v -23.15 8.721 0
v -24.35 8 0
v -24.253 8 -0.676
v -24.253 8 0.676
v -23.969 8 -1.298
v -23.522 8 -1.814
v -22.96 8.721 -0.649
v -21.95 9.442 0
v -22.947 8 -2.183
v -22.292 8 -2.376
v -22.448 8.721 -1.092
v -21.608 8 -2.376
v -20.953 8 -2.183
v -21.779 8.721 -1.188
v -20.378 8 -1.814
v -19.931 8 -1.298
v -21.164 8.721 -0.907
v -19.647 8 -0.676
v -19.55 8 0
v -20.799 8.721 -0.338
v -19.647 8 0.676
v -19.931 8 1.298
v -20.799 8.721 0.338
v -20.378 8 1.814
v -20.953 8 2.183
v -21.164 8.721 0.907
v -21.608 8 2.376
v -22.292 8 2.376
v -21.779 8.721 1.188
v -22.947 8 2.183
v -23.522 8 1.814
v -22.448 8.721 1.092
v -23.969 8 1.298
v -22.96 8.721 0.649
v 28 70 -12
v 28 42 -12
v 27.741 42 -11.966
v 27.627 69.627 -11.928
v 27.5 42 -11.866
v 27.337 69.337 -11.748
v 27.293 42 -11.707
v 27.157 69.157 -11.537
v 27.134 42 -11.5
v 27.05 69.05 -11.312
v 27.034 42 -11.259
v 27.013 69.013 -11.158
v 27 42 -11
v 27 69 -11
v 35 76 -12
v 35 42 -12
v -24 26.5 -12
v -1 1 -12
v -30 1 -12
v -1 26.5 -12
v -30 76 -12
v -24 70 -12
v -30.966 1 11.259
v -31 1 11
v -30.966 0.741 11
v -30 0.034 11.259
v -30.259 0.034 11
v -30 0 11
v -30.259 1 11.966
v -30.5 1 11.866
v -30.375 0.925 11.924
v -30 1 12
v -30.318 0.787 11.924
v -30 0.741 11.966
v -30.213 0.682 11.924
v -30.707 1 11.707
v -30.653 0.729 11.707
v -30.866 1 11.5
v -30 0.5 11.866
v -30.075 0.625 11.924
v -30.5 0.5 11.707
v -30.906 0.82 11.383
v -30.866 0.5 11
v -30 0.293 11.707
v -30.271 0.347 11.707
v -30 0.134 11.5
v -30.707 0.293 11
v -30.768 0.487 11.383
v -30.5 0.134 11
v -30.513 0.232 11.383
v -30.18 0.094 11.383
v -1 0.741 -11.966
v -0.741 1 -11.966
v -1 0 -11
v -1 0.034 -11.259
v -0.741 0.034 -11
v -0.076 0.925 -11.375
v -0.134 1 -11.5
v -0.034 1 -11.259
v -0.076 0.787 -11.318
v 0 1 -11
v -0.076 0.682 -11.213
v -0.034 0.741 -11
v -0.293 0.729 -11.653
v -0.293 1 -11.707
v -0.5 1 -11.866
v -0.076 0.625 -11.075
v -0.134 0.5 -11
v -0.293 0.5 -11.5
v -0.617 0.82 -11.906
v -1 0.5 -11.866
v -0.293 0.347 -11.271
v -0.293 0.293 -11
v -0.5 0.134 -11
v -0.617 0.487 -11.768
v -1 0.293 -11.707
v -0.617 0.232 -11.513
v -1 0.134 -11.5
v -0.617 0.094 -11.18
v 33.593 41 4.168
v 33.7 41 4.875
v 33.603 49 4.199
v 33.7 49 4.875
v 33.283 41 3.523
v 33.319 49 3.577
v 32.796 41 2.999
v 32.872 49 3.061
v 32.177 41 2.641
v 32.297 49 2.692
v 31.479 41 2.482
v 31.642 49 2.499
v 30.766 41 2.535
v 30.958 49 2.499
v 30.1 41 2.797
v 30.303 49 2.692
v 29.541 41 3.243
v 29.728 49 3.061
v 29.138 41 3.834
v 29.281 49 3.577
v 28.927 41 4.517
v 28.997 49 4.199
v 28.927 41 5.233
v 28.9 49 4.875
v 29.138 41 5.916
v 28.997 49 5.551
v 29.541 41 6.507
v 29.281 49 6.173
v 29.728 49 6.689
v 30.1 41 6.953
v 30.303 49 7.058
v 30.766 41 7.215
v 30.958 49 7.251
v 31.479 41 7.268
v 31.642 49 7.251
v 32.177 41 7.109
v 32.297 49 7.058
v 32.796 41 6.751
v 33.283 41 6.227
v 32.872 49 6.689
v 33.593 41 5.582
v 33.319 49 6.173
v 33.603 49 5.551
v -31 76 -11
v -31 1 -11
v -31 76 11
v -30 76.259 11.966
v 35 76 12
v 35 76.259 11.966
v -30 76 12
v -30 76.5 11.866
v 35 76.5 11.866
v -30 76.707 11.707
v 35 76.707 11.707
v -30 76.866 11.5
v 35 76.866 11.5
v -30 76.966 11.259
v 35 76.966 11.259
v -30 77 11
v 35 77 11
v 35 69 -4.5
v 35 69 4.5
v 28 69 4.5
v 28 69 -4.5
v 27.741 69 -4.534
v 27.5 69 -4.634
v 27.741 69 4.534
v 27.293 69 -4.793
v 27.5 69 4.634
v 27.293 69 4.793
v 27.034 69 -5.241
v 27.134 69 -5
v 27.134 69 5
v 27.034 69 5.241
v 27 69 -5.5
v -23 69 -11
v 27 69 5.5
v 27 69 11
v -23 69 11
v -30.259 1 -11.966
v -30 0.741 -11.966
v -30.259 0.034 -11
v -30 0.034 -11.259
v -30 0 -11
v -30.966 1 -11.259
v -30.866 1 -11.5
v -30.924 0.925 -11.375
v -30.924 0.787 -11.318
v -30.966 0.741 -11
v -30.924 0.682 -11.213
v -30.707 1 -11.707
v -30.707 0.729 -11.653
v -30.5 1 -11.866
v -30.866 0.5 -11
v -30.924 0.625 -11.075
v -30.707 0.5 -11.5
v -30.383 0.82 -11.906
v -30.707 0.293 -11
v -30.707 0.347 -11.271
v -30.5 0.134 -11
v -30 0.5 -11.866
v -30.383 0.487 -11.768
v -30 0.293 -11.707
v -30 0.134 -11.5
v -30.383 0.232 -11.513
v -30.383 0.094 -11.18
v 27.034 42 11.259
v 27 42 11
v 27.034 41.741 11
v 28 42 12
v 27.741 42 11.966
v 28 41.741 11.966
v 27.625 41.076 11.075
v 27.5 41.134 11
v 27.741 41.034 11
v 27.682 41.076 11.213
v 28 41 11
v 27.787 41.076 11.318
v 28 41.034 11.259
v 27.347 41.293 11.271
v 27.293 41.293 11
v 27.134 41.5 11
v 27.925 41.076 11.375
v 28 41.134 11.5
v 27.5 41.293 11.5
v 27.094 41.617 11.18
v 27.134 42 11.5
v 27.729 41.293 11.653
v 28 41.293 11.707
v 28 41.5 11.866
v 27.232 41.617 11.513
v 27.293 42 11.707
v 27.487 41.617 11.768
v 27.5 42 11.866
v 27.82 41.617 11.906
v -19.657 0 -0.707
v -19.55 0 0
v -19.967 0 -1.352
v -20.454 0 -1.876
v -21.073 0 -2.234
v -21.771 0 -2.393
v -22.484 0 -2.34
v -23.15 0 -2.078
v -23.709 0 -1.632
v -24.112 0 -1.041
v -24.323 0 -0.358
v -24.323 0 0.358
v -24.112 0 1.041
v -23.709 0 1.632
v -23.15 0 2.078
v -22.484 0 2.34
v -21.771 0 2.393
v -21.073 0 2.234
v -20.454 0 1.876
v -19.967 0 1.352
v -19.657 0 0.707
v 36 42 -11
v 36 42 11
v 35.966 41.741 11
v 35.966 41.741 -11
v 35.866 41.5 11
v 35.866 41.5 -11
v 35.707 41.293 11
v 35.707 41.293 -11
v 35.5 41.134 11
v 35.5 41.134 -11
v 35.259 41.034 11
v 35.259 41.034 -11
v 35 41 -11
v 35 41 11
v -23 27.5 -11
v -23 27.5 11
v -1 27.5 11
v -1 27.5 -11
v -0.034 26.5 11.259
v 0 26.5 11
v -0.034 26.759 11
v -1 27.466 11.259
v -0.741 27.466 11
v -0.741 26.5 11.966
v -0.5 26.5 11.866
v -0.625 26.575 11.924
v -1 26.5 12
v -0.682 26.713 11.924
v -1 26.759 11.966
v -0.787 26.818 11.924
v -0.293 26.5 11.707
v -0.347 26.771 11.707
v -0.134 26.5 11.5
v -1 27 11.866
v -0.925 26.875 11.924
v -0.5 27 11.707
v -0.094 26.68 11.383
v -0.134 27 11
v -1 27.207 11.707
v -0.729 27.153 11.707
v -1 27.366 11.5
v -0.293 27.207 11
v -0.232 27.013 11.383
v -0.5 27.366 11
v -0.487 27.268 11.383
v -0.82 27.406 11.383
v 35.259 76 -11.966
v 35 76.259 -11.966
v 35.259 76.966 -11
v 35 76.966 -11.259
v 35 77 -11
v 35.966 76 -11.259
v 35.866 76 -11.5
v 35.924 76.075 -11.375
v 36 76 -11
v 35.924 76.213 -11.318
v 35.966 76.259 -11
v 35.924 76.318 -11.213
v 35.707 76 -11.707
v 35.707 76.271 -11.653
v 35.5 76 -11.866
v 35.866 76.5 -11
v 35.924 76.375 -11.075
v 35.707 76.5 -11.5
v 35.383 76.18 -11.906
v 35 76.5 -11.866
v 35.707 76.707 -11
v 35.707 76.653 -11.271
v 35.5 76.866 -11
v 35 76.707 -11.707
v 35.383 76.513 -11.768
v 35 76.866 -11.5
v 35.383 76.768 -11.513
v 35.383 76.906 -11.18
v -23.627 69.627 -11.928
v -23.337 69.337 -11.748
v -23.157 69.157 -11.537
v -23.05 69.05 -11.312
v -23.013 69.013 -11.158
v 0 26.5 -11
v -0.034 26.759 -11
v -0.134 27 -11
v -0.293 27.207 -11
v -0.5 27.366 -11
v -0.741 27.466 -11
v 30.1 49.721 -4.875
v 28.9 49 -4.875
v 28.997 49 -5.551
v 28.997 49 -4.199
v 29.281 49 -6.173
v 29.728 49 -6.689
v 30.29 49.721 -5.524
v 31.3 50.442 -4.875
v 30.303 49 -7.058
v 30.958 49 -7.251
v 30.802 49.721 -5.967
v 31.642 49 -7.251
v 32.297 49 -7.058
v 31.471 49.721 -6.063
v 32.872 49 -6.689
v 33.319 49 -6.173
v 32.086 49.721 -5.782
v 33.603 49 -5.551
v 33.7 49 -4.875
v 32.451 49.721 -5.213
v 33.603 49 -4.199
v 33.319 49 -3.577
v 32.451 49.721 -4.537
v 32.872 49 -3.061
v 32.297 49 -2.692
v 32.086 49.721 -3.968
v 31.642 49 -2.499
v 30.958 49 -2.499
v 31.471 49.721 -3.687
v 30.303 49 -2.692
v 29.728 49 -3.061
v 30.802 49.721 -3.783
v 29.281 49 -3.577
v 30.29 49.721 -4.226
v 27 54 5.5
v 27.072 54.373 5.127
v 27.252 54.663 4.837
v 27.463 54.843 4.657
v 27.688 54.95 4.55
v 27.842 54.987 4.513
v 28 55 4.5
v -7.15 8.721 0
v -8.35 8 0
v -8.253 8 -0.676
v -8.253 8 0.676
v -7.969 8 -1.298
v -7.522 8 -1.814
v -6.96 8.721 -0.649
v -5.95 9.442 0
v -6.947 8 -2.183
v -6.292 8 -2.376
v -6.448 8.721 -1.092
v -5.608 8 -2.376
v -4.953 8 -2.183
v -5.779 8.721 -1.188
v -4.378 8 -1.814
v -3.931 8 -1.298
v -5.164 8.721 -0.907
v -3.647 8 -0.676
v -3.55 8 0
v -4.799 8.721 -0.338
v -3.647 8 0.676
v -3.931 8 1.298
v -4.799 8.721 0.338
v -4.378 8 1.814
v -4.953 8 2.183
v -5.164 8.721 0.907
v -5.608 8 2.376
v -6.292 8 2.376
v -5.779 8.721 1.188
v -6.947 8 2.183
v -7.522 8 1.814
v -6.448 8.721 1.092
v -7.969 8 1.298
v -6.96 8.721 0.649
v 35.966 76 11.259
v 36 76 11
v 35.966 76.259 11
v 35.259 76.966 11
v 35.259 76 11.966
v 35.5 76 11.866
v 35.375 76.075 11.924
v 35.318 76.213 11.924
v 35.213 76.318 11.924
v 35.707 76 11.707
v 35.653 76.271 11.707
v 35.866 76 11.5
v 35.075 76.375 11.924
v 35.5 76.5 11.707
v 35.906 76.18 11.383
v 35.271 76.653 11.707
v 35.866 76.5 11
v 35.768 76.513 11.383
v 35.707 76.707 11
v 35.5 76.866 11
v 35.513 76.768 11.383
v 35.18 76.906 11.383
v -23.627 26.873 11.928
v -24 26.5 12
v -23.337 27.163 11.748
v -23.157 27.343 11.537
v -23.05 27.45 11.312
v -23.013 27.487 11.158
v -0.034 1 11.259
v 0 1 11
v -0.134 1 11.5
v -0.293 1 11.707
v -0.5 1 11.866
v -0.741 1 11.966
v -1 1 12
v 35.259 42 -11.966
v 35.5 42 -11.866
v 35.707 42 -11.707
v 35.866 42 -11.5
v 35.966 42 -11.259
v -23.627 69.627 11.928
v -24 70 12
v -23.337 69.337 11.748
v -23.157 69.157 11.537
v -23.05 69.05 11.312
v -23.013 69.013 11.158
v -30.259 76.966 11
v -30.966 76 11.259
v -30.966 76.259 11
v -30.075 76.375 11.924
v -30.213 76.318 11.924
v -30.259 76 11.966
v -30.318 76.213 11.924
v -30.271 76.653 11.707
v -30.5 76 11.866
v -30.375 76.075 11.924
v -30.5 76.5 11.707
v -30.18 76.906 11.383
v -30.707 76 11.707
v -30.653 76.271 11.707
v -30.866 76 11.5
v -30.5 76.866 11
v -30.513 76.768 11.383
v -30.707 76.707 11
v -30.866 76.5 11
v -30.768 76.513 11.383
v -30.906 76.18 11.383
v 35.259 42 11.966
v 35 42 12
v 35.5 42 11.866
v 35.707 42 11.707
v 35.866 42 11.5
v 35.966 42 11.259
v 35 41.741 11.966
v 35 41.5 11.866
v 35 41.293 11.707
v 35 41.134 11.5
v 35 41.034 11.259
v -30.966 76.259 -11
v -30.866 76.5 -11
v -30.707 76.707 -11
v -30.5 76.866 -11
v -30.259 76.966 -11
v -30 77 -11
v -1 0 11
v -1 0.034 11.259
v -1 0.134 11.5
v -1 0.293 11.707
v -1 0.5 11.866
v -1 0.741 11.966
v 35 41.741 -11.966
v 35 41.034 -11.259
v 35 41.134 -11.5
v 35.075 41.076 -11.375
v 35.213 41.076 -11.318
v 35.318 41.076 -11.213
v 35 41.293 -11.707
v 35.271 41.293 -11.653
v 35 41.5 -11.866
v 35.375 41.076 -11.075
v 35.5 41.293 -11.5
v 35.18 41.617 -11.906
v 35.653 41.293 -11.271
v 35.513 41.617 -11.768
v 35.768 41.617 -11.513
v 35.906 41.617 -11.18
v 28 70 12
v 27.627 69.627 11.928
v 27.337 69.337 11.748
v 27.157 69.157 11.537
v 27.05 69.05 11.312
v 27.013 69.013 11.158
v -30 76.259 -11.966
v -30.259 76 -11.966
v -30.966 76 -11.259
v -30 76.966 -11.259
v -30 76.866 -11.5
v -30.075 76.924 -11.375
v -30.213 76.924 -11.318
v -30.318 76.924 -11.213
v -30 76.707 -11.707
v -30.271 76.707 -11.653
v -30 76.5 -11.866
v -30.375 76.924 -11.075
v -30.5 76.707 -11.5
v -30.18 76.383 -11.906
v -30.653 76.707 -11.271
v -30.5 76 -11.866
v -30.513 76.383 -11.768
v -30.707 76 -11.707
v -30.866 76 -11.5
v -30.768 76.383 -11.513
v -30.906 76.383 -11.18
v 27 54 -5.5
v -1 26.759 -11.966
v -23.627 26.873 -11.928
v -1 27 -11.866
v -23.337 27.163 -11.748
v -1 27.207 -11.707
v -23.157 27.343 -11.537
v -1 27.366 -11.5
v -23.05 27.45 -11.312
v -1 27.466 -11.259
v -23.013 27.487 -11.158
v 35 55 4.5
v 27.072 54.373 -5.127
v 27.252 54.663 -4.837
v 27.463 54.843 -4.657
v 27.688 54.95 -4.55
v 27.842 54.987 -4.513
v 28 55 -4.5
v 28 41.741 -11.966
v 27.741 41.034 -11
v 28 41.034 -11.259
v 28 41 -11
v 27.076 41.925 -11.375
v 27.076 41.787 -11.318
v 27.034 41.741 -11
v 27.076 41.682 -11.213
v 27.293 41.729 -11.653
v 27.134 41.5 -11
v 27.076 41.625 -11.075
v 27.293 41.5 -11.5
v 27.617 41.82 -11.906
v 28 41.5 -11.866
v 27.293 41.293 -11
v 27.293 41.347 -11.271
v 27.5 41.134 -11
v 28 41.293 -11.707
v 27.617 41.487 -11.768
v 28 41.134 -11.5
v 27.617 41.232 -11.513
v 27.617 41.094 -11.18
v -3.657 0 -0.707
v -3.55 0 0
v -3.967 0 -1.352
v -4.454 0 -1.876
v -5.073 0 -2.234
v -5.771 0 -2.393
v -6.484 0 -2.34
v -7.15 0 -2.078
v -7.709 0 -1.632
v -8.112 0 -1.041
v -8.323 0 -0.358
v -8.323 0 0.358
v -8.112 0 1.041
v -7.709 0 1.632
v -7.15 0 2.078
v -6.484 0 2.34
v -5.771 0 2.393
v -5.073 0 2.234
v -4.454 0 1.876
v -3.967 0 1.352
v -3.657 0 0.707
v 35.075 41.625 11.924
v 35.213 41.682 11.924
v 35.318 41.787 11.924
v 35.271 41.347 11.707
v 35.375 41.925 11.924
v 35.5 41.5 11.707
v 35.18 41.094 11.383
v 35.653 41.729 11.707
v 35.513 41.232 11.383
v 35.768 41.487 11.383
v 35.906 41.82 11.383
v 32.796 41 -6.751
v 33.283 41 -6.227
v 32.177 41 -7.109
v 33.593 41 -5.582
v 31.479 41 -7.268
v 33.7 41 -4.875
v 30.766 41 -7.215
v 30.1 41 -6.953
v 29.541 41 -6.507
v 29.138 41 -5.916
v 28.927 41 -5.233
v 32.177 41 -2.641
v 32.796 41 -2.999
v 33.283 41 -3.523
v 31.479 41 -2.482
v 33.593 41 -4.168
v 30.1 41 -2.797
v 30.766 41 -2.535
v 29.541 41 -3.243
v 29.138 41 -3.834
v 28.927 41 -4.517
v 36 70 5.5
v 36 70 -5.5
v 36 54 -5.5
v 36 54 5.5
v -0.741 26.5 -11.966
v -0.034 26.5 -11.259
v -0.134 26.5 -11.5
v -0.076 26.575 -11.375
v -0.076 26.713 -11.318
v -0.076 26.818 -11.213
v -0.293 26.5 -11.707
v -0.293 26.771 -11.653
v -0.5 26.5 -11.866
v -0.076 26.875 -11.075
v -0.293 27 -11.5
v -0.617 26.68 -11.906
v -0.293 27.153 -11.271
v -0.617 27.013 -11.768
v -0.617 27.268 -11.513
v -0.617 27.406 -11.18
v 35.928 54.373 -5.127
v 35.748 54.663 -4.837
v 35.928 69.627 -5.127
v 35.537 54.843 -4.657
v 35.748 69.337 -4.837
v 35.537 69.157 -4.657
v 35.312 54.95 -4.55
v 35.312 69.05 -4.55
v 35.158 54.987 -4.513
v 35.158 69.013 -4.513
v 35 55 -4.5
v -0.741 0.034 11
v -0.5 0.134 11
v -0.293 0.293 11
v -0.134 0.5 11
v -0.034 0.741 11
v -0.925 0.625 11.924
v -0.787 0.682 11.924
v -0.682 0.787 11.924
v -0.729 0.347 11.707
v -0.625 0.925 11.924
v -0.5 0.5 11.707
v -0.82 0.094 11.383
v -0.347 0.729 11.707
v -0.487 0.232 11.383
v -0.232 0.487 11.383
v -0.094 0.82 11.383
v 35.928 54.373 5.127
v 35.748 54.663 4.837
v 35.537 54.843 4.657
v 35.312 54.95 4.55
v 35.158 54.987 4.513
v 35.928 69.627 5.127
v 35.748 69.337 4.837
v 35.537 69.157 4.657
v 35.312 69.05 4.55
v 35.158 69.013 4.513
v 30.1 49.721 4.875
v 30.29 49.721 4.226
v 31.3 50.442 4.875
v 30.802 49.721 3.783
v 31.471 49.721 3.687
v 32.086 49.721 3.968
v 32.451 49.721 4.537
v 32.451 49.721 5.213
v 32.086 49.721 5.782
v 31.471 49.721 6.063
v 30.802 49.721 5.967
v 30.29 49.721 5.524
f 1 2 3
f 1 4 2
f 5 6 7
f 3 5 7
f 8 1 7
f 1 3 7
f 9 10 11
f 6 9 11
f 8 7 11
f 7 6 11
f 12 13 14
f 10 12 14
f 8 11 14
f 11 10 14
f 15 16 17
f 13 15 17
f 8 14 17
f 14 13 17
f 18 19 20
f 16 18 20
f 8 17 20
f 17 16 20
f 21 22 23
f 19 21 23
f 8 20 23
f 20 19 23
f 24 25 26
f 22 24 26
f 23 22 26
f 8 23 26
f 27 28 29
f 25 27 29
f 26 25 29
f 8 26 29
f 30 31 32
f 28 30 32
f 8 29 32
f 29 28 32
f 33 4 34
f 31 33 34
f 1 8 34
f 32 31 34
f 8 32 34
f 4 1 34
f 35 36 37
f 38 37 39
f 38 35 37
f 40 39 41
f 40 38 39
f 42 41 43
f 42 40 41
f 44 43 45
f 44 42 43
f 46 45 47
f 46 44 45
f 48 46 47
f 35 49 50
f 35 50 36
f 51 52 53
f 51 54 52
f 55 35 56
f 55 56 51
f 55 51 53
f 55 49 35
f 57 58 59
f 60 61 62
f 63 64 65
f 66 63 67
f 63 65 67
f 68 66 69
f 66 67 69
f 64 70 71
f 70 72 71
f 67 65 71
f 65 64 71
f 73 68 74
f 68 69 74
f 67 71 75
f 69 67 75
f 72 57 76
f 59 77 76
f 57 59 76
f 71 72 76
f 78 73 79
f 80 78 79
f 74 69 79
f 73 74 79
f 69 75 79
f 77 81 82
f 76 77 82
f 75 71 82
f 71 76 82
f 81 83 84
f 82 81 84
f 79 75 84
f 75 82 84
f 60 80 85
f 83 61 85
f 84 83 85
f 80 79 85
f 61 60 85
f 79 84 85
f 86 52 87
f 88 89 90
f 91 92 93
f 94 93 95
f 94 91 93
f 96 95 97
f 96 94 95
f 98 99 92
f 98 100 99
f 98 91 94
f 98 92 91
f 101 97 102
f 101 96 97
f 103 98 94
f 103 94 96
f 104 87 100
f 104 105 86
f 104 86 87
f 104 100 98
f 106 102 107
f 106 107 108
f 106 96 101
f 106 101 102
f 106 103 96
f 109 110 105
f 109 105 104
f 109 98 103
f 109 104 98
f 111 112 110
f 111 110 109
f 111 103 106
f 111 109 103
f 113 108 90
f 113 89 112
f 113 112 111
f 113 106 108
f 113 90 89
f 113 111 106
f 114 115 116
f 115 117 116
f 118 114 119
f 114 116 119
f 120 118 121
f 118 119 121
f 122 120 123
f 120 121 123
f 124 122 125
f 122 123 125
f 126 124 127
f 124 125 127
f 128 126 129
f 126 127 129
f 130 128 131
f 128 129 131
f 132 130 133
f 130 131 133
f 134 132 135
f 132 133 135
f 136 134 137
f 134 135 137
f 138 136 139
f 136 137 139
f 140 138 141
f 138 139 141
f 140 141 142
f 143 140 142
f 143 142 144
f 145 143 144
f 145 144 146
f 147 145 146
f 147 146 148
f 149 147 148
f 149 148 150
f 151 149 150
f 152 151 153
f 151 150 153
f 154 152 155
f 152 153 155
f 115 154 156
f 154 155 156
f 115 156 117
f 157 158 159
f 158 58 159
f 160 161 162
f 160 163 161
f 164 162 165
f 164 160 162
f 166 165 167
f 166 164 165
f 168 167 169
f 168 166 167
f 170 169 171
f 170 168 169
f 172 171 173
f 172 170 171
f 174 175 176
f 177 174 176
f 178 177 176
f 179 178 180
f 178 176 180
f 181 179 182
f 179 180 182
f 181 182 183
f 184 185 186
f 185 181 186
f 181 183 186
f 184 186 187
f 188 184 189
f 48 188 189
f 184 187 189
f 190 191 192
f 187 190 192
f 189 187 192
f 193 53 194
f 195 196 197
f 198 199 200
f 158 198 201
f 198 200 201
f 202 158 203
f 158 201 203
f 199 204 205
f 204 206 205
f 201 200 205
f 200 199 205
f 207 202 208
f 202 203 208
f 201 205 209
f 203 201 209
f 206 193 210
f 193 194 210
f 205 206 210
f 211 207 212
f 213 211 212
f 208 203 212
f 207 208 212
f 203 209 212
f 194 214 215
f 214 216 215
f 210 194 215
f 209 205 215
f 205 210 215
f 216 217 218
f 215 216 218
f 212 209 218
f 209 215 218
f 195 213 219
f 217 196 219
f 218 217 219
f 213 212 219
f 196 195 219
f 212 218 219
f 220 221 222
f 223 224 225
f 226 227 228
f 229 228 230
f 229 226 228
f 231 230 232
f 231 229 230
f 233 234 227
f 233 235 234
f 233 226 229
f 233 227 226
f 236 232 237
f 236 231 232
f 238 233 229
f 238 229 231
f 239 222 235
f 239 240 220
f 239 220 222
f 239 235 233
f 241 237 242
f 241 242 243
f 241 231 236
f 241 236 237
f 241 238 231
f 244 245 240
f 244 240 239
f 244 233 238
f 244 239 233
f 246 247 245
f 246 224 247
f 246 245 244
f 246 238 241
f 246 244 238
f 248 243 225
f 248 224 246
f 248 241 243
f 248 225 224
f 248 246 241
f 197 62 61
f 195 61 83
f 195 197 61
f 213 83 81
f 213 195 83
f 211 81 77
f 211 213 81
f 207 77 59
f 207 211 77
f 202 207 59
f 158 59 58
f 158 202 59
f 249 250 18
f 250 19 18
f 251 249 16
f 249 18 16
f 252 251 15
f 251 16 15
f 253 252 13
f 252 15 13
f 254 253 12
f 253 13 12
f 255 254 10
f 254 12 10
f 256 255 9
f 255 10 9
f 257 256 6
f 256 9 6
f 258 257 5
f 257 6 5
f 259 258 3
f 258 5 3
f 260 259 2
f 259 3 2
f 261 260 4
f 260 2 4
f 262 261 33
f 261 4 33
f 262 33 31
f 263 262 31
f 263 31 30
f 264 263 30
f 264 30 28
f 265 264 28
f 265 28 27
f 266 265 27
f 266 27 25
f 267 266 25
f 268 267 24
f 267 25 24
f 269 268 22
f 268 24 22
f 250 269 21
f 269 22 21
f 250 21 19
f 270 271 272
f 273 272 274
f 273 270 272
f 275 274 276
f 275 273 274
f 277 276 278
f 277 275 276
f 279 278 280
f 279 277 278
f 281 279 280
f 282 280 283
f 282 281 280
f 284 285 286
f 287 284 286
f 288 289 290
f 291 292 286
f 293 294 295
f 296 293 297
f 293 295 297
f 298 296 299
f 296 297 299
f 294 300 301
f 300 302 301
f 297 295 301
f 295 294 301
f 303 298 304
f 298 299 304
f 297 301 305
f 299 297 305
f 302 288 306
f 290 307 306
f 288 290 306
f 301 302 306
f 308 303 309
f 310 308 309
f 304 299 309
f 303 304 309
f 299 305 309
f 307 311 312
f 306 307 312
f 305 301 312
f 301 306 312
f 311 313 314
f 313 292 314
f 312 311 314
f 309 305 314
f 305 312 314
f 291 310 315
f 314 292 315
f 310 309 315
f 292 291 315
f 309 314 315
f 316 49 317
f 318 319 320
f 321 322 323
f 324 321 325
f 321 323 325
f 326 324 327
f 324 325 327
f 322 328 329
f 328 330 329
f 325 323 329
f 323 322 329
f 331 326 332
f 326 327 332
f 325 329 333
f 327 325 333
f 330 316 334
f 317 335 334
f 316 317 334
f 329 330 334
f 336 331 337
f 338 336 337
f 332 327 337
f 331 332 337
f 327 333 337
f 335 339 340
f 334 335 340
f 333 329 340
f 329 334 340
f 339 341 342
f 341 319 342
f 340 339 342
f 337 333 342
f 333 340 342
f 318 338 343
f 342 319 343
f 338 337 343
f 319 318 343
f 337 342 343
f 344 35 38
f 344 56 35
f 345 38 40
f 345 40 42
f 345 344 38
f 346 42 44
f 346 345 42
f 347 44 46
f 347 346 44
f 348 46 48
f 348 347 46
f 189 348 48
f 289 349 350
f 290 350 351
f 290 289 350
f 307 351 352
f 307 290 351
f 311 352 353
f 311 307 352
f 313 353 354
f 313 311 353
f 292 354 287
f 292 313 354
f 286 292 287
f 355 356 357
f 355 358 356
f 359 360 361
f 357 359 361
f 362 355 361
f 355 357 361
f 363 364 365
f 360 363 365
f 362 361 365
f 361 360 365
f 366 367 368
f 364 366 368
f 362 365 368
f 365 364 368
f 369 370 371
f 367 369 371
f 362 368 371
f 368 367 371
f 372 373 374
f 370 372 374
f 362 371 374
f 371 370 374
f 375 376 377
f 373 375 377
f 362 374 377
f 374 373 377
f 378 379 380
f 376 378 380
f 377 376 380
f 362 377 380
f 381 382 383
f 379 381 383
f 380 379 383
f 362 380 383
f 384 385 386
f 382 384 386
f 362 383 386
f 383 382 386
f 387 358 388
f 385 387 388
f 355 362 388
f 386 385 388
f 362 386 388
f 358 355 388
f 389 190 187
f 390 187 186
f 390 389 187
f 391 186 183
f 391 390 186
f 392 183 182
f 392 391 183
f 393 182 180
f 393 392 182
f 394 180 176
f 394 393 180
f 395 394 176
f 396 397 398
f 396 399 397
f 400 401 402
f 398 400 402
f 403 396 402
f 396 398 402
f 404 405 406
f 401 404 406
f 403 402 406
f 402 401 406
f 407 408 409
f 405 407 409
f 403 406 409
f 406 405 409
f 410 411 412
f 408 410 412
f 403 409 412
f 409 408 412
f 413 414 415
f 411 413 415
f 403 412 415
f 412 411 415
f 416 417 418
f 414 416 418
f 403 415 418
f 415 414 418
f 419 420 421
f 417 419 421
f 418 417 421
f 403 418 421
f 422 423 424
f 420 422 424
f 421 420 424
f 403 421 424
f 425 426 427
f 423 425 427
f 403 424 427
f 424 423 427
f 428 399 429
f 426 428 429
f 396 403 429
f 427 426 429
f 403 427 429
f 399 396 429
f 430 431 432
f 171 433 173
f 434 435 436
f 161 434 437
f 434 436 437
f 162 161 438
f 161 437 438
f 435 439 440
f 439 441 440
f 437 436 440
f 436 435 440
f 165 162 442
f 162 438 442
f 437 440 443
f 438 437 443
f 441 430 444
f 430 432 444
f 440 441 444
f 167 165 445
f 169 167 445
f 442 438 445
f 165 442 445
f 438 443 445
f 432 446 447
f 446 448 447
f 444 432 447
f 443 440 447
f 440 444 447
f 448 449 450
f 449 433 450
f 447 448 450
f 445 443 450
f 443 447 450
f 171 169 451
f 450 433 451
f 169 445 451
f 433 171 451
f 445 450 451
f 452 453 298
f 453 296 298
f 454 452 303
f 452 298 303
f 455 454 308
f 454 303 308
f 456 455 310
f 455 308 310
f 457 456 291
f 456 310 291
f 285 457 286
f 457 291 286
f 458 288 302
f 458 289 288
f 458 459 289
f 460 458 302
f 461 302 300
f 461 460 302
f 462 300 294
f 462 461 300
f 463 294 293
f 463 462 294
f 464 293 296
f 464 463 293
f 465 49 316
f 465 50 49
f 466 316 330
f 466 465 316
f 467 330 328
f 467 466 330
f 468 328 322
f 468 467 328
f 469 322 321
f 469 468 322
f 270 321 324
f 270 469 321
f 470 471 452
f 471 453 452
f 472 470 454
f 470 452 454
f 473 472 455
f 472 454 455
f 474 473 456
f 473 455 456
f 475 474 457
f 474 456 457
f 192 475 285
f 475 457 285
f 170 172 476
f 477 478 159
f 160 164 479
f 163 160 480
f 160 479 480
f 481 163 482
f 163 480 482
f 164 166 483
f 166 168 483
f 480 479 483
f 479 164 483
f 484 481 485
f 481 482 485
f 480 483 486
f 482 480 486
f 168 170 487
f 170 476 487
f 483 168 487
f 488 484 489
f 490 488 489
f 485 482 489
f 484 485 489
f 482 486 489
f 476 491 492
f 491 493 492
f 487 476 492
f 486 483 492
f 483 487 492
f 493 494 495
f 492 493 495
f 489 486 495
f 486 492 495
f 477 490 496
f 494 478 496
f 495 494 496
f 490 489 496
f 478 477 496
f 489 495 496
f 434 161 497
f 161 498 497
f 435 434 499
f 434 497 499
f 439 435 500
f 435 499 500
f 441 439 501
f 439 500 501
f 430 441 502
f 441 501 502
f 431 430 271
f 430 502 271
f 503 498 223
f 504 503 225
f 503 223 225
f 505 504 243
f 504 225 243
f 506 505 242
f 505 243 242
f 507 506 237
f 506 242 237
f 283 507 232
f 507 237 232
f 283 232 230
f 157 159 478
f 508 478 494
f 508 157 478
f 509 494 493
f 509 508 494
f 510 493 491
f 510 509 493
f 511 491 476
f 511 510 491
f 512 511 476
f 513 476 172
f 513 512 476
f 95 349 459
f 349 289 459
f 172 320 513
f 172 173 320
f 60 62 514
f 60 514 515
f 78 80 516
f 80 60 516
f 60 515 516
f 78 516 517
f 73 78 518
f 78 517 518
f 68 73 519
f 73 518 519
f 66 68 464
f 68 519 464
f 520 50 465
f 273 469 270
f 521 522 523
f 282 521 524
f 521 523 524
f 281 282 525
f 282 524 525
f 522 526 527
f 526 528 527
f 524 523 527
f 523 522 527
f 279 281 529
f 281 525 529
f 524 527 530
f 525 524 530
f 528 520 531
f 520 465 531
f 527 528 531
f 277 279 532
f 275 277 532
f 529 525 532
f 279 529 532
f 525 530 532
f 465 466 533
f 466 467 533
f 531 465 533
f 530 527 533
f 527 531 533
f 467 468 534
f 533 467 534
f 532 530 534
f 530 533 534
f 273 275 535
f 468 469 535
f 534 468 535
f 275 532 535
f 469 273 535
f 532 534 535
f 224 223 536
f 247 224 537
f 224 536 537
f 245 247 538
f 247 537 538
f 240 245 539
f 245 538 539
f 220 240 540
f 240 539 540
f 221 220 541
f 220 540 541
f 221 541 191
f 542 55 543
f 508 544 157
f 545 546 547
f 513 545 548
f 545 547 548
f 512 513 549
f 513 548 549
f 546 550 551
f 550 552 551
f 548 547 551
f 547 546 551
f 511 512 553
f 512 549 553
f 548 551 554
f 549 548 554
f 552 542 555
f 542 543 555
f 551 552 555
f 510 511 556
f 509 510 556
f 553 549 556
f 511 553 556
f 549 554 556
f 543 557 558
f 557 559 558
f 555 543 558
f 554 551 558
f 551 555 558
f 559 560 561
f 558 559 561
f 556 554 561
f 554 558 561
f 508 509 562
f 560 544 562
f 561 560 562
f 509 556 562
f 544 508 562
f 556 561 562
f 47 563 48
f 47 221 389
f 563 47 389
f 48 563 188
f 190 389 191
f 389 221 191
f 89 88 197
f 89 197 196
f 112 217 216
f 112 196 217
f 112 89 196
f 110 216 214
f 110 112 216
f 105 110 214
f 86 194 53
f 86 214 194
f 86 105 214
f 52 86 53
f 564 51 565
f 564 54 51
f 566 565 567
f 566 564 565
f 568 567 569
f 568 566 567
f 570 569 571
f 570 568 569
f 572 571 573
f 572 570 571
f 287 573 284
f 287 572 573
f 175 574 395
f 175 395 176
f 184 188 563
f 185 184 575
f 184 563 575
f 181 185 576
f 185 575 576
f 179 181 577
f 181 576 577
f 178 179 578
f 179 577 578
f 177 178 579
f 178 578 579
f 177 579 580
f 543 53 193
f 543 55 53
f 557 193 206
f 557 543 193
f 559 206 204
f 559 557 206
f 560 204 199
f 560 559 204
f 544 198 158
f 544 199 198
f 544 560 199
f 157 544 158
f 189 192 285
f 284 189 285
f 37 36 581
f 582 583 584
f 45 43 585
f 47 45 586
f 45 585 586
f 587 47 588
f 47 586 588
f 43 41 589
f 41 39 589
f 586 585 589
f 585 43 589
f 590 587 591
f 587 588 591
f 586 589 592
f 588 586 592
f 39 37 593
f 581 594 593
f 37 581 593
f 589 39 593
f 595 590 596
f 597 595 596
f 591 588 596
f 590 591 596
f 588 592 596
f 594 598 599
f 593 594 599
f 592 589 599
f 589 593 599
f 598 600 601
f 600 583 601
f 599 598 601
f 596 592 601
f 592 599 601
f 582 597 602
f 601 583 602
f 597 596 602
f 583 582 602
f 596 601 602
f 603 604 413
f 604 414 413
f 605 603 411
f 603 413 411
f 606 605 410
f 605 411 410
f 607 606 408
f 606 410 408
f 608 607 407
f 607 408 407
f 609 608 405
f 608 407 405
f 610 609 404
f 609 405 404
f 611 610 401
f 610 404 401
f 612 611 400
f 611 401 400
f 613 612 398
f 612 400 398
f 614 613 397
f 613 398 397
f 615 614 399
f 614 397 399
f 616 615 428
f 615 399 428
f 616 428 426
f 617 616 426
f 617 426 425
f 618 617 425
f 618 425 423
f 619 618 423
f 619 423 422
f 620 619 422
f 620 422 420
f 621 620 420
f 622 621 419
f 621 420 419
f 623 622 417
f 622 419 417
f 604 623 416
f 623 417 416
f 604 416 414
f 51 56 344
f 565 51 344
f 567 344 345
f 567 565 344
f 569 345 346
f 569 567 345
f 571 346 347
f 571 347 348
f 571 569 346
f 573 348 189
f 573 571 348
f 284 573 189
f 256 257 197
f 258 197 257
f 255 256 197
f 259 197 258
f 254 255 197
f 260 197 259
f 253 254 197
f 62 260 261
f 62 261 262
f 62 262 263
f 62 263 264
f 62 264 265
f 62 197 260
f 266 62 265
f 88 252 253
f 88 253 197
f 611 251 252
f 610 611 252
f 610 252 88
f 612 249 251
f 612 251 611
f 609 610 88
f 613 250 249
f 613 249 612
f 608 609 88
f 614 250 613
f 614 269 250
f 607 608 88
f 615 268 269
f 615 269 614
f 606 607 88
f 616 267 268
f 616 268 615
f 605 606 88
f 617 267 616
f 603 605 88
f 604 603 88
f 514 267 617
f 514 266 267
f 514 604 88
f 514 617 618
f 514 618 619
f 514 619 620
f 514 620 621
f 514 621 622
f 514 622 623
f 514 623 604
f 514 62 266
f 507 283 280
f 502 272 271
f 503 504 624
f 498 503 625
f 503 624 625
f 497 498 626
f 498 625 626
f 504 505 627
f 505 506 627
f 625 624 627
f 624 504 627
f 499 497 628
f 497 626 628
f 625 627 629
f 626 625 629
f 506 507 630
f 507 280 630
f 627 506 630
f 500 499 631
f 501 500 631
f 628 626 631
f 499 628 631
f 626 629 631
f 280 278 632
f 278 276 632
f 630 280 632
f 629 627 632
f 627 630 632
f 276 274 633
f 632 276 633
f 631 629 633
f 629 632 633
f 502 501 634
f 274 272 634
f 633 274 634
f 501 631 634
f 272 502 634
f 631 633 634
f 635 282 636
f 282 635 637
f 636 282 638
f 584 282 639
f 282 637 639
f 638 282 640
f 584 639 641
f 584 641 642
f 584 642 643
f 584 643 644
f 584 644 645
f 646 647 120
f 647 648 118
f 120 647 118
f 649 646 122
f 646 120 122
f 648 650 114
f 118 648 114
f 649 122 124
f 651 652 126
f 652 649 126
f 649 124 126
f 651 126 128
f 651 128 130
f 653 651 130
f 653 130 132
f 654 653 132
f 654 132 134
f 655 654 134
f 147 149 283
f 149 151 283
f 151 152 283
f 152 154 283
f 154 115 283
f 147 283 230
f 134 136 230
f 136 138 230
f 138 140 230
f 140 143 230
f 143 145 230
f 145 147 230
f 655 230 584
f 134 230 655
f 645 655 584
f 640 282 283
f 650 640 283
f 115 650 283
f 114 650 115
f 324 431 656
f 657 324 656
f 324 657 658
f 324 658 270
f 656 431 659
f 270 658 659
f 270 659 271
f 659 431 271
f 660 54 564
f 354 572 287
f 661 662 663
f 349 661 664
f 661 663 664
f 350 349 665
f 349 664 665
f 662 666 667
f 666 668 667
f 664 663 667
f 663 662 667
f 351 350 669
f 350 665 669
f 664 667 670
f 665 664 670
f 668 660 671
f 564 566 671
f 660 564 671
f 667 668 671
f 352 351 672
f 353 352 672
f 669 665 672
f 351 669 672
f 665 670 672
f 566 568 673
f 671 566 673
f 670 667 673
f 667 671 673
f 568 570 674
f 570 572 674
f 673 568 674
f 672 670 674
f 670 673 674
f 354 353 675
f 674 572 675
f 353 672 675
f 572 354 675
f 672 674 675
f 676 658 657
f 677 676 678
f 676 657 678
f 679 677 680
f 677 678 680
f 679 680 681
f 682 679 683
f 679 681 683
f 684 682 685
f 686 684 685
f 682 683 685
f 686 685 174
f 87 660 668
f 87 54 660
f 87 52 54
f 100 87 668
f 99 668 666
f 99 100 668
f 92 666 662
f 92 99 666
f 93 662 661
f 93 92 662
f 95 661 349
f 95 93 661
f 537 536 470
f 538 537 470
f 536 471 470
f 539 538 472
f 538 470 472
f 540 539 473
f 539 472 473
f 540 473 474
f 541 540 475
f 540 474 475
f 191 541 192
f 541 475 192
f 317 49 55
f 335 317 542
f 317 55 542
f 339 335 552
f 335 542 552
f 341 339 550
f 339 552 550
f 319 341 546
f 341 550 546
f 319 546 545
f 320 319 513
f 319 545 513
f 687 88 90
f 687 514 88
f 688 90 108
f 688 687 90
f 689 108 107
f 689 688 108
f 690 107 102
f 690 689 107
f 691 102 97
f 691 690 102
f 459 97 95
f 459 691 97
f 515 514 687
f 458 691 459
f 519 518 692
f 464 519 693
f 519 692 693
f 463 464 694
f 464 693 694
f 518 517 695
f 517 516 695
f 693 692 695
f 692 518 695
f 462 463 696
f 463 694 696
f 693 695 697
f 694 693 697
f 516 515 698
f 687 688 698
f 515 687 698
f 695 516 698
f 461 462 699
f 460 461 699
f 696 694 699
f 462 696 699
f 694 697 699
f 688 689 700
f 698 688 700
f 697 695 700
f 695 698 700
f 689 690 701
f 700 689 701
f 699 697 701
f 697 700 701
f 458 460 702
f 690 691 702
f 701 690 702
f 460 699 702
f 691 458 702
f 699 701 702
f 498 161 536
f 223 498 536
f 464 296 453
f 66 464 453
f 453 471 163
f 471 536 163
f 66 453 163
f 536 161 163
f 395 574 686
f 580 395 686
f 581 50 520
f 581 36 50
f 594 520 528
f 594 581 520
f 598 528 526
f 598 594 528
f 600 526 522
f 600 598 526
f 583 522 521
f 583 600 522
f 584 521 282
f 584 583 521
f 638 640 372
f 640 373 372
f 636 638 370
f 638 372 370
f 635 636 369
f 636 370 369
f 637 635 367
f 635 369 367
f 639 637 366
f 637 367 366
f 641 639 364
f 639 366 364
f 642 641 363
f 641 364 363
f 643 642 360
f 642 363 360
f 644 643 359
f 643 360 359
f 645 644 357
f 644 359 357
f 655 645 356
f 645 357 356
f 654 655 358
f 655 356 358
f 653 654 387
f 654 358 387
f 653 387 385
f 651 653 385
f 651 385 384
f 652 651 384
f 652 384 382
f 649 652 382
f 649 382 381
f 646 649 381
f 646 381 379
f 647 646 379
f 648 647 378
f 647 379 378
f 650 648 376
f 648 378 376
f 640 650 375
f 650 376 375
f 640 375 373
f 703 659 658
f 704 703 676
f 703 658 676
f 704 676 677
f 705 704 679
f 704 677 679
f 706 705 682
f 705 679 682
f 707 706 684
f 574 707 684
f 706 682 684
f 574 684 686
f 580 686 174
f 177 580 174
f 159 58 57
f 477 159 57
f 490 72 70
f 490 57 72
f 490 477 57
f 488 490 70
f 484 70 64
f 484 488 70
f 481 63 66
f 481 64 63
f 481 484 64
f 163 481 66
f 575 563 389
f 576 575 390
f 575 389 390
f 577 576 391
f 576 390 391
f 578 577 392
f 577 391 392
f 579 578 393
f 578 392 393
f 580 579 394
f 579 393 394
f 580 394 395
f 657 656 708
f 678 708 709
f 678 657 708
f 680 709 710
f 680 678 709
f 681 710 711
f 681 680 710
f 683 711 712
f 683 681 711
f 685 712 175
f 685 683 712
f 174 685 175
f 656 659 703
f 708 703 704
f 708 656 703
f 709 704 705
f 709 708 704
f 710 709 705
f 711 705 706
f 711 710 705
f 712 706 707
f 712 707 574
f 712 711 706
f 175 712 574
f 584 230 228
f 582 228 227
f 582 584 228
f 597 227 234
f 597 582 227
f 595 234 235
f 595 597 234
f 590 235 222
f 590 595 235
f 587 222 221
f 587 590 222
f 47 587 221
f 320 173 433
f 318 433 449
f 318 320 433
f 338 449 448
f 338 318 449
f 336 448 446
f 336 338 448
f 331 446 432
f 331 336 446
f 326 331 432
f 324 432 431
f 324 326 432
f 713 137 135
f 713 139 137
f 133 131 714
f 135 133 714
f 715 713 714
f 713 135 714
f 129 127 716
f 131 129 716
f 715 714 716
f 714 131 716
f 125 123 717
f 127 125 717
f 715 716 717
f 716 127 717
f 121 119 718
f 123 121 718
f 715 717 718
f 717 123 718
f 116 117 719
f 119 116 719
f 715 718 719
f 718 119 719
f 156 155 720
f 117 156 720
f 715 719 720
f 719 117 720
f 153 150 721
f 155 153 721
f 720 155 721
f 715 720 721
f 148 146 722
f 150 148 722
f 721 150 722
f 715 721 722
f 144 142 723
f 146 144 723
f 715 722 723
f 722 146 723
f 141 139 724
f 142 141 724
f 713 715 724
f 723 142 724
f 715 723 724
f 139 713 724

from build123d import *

# Parameters (mm, degrees)
BOSS_EXTRUDE1_DEPTH            = 12
F_4_8_4_8_DIAMETER_HOLE1_D     = 4.8
F_4_8_4_8_DIAMETER_HOLE1_DEPTH = 8
F_4_8_4_8_DIAMETER_HOLE1_TIP   = 1.442065486
F_4_8_4_8_DIAMETER_HOLE2_D     = 4.8
F_4_8_4_8_DIAMETER_HOLE2_DEPTH = 8
F_4_8_4_8_DIAMETER_HOLE2_TIP   = 1.442065486
CUT_EXTRUDE1_REACH             = 104.772
SKETCH11_W                     = 9
SKETCH11_H                     = 14
FILLET1_R                      = 1


with BuildPart() as part:
    # Sketch1 → Boss-Extrude1 (new, symmetric)
    with BuildSketch(Plane.XY):
        Polygon((0, 0), (-23, 0), (-31, 0), (-31, 77), (-23.404895261, 77), (36, 77), (36, 41), (27, 41), (27, 69), (-23, 69), (-23, 27.5), (0, 27.5), align=None)
    extrude(amount=BOSS_EXTRUDE1_DEPTH, both=True)

    # Ø4.8 (4.8) Diameter Hole1
    with Locations(Plane(origin=(0, 41, 0), x_dir=(-1, 0, 0), z_dir=(0, -1, 0))):
        with Locations((-31.3, 4.875), (-31.3, -4.875)):
            Hole(F_4_8_4_8_DIAMETER_HOLE1_D / 2, depth=F_4_8_4_8_DIAMETER_HOLE1_DEPTH)
            with Locations((0, 0, -(F_4_8_4_8_DIAMETER_HOLE1_DEPTH + F_4_8_4_8_DIAMETER_HOLE1_TIP / 2))):  # 118° drill point
                Cone(0, F_4_8_4_8_DIAMETER_HOLE1_D / 2, F_4_8_4_8_DIAMETER_HOLE1_TIP, mode=Mode.SUBTRACT)

    # Ø4.8 (4.8) Diameter Hole2
    with Locations(Plane(origin=(0, 0, 0), x_dir=(-1, 0, 0), z_dir=(0, -1, 0))):
        with Locations((5.95, 0), (21.95, 0)):
            Hole(F_4_8_4_8_DIAMETER_HOLE2_D / 2, depth=F_4_8_4_8_DIAMETER_HOLE2_DEPTH)
            with Locations((0, 0, -(F_4_8_4_8_DIAMETER_HOLE2_DEPTH + F_4_8_4_8_DIAMETER_HOLE2_TIP / 2))):  # 118° drill point
                Cone(0, F_4_8_4_8_DIAMETER_HOLE2_D / 2, F_4_8_4_8_DIAMETER_HOLE2_TIP, mode=Mode.SUBTRACT)

    # Sketch11 → Cut-Extrude1 (cut, up to next)
    with BuildSketch(Plane(origin=(36, 0, 0), x_dir=(0, 0, -1), z_dir=(1, 0, 0)), mode=Mode.PRIVATE) as cut_extrude1_sk1:
        with Locations((0, 62)):
            Rectangle(SKETCH11_W, SKETCH11_H)
    cut_extrude1_tool1 = extrude(cut_extrude1_sk1.sketch, amount=-CUT_EXTRUDE1_REACH, mode=Mode.PRIVATE) & part.part
    add(cut_extrude1_tool1.solids().sort_by_distance((36, 62, 0))[0], mode=Mode.SUBTRACT)

    # Fillet1
    fillet1_edges = [part.edges().sort_by_distance(p)[0] for p in [
        (-15.5, 0, -12),
        (-23, 48.25, 12),
        (-31, 38.5, -12),
        (2.5, 77, -12),
        (36, 59, -12),
        (31.5, 41, -12),
        (27, 55, -12),
        (2, 69, -12),
        (-23, 48.25, -12),
        (-11.5, 27.5, -12),
        (0, 13.75, -12),
        (2, 69, 12),
        (0, 0, 0),
        (-31, 0, 0),
        (27, 55, 12),
        (-31, 77, 0),
        (36, 77, 0),
        (36, 41, 0),
        (27, 41, 0),
        (0, 27.5, 0),
        (31.5, 41, 12),
        (36, 59, 12),
        (2.5, 77, 12),
        (-31, 38.5, 12),
        (-15.5, 0, 12),
        (0, 13.75, 12),
        (36, 62, 4.5),
        (36, 55, 0),
        (36, 62, -4.5),
        (36, 69, 0),
        (27, 55, 0),
        (27, 62, 4.5),
        (27, 62, -4.5),
        (-11.5, 27.5, 12),
    ]]
    fillet(fillet1_edges, radius=FILLET1_R)


solid = part.part
